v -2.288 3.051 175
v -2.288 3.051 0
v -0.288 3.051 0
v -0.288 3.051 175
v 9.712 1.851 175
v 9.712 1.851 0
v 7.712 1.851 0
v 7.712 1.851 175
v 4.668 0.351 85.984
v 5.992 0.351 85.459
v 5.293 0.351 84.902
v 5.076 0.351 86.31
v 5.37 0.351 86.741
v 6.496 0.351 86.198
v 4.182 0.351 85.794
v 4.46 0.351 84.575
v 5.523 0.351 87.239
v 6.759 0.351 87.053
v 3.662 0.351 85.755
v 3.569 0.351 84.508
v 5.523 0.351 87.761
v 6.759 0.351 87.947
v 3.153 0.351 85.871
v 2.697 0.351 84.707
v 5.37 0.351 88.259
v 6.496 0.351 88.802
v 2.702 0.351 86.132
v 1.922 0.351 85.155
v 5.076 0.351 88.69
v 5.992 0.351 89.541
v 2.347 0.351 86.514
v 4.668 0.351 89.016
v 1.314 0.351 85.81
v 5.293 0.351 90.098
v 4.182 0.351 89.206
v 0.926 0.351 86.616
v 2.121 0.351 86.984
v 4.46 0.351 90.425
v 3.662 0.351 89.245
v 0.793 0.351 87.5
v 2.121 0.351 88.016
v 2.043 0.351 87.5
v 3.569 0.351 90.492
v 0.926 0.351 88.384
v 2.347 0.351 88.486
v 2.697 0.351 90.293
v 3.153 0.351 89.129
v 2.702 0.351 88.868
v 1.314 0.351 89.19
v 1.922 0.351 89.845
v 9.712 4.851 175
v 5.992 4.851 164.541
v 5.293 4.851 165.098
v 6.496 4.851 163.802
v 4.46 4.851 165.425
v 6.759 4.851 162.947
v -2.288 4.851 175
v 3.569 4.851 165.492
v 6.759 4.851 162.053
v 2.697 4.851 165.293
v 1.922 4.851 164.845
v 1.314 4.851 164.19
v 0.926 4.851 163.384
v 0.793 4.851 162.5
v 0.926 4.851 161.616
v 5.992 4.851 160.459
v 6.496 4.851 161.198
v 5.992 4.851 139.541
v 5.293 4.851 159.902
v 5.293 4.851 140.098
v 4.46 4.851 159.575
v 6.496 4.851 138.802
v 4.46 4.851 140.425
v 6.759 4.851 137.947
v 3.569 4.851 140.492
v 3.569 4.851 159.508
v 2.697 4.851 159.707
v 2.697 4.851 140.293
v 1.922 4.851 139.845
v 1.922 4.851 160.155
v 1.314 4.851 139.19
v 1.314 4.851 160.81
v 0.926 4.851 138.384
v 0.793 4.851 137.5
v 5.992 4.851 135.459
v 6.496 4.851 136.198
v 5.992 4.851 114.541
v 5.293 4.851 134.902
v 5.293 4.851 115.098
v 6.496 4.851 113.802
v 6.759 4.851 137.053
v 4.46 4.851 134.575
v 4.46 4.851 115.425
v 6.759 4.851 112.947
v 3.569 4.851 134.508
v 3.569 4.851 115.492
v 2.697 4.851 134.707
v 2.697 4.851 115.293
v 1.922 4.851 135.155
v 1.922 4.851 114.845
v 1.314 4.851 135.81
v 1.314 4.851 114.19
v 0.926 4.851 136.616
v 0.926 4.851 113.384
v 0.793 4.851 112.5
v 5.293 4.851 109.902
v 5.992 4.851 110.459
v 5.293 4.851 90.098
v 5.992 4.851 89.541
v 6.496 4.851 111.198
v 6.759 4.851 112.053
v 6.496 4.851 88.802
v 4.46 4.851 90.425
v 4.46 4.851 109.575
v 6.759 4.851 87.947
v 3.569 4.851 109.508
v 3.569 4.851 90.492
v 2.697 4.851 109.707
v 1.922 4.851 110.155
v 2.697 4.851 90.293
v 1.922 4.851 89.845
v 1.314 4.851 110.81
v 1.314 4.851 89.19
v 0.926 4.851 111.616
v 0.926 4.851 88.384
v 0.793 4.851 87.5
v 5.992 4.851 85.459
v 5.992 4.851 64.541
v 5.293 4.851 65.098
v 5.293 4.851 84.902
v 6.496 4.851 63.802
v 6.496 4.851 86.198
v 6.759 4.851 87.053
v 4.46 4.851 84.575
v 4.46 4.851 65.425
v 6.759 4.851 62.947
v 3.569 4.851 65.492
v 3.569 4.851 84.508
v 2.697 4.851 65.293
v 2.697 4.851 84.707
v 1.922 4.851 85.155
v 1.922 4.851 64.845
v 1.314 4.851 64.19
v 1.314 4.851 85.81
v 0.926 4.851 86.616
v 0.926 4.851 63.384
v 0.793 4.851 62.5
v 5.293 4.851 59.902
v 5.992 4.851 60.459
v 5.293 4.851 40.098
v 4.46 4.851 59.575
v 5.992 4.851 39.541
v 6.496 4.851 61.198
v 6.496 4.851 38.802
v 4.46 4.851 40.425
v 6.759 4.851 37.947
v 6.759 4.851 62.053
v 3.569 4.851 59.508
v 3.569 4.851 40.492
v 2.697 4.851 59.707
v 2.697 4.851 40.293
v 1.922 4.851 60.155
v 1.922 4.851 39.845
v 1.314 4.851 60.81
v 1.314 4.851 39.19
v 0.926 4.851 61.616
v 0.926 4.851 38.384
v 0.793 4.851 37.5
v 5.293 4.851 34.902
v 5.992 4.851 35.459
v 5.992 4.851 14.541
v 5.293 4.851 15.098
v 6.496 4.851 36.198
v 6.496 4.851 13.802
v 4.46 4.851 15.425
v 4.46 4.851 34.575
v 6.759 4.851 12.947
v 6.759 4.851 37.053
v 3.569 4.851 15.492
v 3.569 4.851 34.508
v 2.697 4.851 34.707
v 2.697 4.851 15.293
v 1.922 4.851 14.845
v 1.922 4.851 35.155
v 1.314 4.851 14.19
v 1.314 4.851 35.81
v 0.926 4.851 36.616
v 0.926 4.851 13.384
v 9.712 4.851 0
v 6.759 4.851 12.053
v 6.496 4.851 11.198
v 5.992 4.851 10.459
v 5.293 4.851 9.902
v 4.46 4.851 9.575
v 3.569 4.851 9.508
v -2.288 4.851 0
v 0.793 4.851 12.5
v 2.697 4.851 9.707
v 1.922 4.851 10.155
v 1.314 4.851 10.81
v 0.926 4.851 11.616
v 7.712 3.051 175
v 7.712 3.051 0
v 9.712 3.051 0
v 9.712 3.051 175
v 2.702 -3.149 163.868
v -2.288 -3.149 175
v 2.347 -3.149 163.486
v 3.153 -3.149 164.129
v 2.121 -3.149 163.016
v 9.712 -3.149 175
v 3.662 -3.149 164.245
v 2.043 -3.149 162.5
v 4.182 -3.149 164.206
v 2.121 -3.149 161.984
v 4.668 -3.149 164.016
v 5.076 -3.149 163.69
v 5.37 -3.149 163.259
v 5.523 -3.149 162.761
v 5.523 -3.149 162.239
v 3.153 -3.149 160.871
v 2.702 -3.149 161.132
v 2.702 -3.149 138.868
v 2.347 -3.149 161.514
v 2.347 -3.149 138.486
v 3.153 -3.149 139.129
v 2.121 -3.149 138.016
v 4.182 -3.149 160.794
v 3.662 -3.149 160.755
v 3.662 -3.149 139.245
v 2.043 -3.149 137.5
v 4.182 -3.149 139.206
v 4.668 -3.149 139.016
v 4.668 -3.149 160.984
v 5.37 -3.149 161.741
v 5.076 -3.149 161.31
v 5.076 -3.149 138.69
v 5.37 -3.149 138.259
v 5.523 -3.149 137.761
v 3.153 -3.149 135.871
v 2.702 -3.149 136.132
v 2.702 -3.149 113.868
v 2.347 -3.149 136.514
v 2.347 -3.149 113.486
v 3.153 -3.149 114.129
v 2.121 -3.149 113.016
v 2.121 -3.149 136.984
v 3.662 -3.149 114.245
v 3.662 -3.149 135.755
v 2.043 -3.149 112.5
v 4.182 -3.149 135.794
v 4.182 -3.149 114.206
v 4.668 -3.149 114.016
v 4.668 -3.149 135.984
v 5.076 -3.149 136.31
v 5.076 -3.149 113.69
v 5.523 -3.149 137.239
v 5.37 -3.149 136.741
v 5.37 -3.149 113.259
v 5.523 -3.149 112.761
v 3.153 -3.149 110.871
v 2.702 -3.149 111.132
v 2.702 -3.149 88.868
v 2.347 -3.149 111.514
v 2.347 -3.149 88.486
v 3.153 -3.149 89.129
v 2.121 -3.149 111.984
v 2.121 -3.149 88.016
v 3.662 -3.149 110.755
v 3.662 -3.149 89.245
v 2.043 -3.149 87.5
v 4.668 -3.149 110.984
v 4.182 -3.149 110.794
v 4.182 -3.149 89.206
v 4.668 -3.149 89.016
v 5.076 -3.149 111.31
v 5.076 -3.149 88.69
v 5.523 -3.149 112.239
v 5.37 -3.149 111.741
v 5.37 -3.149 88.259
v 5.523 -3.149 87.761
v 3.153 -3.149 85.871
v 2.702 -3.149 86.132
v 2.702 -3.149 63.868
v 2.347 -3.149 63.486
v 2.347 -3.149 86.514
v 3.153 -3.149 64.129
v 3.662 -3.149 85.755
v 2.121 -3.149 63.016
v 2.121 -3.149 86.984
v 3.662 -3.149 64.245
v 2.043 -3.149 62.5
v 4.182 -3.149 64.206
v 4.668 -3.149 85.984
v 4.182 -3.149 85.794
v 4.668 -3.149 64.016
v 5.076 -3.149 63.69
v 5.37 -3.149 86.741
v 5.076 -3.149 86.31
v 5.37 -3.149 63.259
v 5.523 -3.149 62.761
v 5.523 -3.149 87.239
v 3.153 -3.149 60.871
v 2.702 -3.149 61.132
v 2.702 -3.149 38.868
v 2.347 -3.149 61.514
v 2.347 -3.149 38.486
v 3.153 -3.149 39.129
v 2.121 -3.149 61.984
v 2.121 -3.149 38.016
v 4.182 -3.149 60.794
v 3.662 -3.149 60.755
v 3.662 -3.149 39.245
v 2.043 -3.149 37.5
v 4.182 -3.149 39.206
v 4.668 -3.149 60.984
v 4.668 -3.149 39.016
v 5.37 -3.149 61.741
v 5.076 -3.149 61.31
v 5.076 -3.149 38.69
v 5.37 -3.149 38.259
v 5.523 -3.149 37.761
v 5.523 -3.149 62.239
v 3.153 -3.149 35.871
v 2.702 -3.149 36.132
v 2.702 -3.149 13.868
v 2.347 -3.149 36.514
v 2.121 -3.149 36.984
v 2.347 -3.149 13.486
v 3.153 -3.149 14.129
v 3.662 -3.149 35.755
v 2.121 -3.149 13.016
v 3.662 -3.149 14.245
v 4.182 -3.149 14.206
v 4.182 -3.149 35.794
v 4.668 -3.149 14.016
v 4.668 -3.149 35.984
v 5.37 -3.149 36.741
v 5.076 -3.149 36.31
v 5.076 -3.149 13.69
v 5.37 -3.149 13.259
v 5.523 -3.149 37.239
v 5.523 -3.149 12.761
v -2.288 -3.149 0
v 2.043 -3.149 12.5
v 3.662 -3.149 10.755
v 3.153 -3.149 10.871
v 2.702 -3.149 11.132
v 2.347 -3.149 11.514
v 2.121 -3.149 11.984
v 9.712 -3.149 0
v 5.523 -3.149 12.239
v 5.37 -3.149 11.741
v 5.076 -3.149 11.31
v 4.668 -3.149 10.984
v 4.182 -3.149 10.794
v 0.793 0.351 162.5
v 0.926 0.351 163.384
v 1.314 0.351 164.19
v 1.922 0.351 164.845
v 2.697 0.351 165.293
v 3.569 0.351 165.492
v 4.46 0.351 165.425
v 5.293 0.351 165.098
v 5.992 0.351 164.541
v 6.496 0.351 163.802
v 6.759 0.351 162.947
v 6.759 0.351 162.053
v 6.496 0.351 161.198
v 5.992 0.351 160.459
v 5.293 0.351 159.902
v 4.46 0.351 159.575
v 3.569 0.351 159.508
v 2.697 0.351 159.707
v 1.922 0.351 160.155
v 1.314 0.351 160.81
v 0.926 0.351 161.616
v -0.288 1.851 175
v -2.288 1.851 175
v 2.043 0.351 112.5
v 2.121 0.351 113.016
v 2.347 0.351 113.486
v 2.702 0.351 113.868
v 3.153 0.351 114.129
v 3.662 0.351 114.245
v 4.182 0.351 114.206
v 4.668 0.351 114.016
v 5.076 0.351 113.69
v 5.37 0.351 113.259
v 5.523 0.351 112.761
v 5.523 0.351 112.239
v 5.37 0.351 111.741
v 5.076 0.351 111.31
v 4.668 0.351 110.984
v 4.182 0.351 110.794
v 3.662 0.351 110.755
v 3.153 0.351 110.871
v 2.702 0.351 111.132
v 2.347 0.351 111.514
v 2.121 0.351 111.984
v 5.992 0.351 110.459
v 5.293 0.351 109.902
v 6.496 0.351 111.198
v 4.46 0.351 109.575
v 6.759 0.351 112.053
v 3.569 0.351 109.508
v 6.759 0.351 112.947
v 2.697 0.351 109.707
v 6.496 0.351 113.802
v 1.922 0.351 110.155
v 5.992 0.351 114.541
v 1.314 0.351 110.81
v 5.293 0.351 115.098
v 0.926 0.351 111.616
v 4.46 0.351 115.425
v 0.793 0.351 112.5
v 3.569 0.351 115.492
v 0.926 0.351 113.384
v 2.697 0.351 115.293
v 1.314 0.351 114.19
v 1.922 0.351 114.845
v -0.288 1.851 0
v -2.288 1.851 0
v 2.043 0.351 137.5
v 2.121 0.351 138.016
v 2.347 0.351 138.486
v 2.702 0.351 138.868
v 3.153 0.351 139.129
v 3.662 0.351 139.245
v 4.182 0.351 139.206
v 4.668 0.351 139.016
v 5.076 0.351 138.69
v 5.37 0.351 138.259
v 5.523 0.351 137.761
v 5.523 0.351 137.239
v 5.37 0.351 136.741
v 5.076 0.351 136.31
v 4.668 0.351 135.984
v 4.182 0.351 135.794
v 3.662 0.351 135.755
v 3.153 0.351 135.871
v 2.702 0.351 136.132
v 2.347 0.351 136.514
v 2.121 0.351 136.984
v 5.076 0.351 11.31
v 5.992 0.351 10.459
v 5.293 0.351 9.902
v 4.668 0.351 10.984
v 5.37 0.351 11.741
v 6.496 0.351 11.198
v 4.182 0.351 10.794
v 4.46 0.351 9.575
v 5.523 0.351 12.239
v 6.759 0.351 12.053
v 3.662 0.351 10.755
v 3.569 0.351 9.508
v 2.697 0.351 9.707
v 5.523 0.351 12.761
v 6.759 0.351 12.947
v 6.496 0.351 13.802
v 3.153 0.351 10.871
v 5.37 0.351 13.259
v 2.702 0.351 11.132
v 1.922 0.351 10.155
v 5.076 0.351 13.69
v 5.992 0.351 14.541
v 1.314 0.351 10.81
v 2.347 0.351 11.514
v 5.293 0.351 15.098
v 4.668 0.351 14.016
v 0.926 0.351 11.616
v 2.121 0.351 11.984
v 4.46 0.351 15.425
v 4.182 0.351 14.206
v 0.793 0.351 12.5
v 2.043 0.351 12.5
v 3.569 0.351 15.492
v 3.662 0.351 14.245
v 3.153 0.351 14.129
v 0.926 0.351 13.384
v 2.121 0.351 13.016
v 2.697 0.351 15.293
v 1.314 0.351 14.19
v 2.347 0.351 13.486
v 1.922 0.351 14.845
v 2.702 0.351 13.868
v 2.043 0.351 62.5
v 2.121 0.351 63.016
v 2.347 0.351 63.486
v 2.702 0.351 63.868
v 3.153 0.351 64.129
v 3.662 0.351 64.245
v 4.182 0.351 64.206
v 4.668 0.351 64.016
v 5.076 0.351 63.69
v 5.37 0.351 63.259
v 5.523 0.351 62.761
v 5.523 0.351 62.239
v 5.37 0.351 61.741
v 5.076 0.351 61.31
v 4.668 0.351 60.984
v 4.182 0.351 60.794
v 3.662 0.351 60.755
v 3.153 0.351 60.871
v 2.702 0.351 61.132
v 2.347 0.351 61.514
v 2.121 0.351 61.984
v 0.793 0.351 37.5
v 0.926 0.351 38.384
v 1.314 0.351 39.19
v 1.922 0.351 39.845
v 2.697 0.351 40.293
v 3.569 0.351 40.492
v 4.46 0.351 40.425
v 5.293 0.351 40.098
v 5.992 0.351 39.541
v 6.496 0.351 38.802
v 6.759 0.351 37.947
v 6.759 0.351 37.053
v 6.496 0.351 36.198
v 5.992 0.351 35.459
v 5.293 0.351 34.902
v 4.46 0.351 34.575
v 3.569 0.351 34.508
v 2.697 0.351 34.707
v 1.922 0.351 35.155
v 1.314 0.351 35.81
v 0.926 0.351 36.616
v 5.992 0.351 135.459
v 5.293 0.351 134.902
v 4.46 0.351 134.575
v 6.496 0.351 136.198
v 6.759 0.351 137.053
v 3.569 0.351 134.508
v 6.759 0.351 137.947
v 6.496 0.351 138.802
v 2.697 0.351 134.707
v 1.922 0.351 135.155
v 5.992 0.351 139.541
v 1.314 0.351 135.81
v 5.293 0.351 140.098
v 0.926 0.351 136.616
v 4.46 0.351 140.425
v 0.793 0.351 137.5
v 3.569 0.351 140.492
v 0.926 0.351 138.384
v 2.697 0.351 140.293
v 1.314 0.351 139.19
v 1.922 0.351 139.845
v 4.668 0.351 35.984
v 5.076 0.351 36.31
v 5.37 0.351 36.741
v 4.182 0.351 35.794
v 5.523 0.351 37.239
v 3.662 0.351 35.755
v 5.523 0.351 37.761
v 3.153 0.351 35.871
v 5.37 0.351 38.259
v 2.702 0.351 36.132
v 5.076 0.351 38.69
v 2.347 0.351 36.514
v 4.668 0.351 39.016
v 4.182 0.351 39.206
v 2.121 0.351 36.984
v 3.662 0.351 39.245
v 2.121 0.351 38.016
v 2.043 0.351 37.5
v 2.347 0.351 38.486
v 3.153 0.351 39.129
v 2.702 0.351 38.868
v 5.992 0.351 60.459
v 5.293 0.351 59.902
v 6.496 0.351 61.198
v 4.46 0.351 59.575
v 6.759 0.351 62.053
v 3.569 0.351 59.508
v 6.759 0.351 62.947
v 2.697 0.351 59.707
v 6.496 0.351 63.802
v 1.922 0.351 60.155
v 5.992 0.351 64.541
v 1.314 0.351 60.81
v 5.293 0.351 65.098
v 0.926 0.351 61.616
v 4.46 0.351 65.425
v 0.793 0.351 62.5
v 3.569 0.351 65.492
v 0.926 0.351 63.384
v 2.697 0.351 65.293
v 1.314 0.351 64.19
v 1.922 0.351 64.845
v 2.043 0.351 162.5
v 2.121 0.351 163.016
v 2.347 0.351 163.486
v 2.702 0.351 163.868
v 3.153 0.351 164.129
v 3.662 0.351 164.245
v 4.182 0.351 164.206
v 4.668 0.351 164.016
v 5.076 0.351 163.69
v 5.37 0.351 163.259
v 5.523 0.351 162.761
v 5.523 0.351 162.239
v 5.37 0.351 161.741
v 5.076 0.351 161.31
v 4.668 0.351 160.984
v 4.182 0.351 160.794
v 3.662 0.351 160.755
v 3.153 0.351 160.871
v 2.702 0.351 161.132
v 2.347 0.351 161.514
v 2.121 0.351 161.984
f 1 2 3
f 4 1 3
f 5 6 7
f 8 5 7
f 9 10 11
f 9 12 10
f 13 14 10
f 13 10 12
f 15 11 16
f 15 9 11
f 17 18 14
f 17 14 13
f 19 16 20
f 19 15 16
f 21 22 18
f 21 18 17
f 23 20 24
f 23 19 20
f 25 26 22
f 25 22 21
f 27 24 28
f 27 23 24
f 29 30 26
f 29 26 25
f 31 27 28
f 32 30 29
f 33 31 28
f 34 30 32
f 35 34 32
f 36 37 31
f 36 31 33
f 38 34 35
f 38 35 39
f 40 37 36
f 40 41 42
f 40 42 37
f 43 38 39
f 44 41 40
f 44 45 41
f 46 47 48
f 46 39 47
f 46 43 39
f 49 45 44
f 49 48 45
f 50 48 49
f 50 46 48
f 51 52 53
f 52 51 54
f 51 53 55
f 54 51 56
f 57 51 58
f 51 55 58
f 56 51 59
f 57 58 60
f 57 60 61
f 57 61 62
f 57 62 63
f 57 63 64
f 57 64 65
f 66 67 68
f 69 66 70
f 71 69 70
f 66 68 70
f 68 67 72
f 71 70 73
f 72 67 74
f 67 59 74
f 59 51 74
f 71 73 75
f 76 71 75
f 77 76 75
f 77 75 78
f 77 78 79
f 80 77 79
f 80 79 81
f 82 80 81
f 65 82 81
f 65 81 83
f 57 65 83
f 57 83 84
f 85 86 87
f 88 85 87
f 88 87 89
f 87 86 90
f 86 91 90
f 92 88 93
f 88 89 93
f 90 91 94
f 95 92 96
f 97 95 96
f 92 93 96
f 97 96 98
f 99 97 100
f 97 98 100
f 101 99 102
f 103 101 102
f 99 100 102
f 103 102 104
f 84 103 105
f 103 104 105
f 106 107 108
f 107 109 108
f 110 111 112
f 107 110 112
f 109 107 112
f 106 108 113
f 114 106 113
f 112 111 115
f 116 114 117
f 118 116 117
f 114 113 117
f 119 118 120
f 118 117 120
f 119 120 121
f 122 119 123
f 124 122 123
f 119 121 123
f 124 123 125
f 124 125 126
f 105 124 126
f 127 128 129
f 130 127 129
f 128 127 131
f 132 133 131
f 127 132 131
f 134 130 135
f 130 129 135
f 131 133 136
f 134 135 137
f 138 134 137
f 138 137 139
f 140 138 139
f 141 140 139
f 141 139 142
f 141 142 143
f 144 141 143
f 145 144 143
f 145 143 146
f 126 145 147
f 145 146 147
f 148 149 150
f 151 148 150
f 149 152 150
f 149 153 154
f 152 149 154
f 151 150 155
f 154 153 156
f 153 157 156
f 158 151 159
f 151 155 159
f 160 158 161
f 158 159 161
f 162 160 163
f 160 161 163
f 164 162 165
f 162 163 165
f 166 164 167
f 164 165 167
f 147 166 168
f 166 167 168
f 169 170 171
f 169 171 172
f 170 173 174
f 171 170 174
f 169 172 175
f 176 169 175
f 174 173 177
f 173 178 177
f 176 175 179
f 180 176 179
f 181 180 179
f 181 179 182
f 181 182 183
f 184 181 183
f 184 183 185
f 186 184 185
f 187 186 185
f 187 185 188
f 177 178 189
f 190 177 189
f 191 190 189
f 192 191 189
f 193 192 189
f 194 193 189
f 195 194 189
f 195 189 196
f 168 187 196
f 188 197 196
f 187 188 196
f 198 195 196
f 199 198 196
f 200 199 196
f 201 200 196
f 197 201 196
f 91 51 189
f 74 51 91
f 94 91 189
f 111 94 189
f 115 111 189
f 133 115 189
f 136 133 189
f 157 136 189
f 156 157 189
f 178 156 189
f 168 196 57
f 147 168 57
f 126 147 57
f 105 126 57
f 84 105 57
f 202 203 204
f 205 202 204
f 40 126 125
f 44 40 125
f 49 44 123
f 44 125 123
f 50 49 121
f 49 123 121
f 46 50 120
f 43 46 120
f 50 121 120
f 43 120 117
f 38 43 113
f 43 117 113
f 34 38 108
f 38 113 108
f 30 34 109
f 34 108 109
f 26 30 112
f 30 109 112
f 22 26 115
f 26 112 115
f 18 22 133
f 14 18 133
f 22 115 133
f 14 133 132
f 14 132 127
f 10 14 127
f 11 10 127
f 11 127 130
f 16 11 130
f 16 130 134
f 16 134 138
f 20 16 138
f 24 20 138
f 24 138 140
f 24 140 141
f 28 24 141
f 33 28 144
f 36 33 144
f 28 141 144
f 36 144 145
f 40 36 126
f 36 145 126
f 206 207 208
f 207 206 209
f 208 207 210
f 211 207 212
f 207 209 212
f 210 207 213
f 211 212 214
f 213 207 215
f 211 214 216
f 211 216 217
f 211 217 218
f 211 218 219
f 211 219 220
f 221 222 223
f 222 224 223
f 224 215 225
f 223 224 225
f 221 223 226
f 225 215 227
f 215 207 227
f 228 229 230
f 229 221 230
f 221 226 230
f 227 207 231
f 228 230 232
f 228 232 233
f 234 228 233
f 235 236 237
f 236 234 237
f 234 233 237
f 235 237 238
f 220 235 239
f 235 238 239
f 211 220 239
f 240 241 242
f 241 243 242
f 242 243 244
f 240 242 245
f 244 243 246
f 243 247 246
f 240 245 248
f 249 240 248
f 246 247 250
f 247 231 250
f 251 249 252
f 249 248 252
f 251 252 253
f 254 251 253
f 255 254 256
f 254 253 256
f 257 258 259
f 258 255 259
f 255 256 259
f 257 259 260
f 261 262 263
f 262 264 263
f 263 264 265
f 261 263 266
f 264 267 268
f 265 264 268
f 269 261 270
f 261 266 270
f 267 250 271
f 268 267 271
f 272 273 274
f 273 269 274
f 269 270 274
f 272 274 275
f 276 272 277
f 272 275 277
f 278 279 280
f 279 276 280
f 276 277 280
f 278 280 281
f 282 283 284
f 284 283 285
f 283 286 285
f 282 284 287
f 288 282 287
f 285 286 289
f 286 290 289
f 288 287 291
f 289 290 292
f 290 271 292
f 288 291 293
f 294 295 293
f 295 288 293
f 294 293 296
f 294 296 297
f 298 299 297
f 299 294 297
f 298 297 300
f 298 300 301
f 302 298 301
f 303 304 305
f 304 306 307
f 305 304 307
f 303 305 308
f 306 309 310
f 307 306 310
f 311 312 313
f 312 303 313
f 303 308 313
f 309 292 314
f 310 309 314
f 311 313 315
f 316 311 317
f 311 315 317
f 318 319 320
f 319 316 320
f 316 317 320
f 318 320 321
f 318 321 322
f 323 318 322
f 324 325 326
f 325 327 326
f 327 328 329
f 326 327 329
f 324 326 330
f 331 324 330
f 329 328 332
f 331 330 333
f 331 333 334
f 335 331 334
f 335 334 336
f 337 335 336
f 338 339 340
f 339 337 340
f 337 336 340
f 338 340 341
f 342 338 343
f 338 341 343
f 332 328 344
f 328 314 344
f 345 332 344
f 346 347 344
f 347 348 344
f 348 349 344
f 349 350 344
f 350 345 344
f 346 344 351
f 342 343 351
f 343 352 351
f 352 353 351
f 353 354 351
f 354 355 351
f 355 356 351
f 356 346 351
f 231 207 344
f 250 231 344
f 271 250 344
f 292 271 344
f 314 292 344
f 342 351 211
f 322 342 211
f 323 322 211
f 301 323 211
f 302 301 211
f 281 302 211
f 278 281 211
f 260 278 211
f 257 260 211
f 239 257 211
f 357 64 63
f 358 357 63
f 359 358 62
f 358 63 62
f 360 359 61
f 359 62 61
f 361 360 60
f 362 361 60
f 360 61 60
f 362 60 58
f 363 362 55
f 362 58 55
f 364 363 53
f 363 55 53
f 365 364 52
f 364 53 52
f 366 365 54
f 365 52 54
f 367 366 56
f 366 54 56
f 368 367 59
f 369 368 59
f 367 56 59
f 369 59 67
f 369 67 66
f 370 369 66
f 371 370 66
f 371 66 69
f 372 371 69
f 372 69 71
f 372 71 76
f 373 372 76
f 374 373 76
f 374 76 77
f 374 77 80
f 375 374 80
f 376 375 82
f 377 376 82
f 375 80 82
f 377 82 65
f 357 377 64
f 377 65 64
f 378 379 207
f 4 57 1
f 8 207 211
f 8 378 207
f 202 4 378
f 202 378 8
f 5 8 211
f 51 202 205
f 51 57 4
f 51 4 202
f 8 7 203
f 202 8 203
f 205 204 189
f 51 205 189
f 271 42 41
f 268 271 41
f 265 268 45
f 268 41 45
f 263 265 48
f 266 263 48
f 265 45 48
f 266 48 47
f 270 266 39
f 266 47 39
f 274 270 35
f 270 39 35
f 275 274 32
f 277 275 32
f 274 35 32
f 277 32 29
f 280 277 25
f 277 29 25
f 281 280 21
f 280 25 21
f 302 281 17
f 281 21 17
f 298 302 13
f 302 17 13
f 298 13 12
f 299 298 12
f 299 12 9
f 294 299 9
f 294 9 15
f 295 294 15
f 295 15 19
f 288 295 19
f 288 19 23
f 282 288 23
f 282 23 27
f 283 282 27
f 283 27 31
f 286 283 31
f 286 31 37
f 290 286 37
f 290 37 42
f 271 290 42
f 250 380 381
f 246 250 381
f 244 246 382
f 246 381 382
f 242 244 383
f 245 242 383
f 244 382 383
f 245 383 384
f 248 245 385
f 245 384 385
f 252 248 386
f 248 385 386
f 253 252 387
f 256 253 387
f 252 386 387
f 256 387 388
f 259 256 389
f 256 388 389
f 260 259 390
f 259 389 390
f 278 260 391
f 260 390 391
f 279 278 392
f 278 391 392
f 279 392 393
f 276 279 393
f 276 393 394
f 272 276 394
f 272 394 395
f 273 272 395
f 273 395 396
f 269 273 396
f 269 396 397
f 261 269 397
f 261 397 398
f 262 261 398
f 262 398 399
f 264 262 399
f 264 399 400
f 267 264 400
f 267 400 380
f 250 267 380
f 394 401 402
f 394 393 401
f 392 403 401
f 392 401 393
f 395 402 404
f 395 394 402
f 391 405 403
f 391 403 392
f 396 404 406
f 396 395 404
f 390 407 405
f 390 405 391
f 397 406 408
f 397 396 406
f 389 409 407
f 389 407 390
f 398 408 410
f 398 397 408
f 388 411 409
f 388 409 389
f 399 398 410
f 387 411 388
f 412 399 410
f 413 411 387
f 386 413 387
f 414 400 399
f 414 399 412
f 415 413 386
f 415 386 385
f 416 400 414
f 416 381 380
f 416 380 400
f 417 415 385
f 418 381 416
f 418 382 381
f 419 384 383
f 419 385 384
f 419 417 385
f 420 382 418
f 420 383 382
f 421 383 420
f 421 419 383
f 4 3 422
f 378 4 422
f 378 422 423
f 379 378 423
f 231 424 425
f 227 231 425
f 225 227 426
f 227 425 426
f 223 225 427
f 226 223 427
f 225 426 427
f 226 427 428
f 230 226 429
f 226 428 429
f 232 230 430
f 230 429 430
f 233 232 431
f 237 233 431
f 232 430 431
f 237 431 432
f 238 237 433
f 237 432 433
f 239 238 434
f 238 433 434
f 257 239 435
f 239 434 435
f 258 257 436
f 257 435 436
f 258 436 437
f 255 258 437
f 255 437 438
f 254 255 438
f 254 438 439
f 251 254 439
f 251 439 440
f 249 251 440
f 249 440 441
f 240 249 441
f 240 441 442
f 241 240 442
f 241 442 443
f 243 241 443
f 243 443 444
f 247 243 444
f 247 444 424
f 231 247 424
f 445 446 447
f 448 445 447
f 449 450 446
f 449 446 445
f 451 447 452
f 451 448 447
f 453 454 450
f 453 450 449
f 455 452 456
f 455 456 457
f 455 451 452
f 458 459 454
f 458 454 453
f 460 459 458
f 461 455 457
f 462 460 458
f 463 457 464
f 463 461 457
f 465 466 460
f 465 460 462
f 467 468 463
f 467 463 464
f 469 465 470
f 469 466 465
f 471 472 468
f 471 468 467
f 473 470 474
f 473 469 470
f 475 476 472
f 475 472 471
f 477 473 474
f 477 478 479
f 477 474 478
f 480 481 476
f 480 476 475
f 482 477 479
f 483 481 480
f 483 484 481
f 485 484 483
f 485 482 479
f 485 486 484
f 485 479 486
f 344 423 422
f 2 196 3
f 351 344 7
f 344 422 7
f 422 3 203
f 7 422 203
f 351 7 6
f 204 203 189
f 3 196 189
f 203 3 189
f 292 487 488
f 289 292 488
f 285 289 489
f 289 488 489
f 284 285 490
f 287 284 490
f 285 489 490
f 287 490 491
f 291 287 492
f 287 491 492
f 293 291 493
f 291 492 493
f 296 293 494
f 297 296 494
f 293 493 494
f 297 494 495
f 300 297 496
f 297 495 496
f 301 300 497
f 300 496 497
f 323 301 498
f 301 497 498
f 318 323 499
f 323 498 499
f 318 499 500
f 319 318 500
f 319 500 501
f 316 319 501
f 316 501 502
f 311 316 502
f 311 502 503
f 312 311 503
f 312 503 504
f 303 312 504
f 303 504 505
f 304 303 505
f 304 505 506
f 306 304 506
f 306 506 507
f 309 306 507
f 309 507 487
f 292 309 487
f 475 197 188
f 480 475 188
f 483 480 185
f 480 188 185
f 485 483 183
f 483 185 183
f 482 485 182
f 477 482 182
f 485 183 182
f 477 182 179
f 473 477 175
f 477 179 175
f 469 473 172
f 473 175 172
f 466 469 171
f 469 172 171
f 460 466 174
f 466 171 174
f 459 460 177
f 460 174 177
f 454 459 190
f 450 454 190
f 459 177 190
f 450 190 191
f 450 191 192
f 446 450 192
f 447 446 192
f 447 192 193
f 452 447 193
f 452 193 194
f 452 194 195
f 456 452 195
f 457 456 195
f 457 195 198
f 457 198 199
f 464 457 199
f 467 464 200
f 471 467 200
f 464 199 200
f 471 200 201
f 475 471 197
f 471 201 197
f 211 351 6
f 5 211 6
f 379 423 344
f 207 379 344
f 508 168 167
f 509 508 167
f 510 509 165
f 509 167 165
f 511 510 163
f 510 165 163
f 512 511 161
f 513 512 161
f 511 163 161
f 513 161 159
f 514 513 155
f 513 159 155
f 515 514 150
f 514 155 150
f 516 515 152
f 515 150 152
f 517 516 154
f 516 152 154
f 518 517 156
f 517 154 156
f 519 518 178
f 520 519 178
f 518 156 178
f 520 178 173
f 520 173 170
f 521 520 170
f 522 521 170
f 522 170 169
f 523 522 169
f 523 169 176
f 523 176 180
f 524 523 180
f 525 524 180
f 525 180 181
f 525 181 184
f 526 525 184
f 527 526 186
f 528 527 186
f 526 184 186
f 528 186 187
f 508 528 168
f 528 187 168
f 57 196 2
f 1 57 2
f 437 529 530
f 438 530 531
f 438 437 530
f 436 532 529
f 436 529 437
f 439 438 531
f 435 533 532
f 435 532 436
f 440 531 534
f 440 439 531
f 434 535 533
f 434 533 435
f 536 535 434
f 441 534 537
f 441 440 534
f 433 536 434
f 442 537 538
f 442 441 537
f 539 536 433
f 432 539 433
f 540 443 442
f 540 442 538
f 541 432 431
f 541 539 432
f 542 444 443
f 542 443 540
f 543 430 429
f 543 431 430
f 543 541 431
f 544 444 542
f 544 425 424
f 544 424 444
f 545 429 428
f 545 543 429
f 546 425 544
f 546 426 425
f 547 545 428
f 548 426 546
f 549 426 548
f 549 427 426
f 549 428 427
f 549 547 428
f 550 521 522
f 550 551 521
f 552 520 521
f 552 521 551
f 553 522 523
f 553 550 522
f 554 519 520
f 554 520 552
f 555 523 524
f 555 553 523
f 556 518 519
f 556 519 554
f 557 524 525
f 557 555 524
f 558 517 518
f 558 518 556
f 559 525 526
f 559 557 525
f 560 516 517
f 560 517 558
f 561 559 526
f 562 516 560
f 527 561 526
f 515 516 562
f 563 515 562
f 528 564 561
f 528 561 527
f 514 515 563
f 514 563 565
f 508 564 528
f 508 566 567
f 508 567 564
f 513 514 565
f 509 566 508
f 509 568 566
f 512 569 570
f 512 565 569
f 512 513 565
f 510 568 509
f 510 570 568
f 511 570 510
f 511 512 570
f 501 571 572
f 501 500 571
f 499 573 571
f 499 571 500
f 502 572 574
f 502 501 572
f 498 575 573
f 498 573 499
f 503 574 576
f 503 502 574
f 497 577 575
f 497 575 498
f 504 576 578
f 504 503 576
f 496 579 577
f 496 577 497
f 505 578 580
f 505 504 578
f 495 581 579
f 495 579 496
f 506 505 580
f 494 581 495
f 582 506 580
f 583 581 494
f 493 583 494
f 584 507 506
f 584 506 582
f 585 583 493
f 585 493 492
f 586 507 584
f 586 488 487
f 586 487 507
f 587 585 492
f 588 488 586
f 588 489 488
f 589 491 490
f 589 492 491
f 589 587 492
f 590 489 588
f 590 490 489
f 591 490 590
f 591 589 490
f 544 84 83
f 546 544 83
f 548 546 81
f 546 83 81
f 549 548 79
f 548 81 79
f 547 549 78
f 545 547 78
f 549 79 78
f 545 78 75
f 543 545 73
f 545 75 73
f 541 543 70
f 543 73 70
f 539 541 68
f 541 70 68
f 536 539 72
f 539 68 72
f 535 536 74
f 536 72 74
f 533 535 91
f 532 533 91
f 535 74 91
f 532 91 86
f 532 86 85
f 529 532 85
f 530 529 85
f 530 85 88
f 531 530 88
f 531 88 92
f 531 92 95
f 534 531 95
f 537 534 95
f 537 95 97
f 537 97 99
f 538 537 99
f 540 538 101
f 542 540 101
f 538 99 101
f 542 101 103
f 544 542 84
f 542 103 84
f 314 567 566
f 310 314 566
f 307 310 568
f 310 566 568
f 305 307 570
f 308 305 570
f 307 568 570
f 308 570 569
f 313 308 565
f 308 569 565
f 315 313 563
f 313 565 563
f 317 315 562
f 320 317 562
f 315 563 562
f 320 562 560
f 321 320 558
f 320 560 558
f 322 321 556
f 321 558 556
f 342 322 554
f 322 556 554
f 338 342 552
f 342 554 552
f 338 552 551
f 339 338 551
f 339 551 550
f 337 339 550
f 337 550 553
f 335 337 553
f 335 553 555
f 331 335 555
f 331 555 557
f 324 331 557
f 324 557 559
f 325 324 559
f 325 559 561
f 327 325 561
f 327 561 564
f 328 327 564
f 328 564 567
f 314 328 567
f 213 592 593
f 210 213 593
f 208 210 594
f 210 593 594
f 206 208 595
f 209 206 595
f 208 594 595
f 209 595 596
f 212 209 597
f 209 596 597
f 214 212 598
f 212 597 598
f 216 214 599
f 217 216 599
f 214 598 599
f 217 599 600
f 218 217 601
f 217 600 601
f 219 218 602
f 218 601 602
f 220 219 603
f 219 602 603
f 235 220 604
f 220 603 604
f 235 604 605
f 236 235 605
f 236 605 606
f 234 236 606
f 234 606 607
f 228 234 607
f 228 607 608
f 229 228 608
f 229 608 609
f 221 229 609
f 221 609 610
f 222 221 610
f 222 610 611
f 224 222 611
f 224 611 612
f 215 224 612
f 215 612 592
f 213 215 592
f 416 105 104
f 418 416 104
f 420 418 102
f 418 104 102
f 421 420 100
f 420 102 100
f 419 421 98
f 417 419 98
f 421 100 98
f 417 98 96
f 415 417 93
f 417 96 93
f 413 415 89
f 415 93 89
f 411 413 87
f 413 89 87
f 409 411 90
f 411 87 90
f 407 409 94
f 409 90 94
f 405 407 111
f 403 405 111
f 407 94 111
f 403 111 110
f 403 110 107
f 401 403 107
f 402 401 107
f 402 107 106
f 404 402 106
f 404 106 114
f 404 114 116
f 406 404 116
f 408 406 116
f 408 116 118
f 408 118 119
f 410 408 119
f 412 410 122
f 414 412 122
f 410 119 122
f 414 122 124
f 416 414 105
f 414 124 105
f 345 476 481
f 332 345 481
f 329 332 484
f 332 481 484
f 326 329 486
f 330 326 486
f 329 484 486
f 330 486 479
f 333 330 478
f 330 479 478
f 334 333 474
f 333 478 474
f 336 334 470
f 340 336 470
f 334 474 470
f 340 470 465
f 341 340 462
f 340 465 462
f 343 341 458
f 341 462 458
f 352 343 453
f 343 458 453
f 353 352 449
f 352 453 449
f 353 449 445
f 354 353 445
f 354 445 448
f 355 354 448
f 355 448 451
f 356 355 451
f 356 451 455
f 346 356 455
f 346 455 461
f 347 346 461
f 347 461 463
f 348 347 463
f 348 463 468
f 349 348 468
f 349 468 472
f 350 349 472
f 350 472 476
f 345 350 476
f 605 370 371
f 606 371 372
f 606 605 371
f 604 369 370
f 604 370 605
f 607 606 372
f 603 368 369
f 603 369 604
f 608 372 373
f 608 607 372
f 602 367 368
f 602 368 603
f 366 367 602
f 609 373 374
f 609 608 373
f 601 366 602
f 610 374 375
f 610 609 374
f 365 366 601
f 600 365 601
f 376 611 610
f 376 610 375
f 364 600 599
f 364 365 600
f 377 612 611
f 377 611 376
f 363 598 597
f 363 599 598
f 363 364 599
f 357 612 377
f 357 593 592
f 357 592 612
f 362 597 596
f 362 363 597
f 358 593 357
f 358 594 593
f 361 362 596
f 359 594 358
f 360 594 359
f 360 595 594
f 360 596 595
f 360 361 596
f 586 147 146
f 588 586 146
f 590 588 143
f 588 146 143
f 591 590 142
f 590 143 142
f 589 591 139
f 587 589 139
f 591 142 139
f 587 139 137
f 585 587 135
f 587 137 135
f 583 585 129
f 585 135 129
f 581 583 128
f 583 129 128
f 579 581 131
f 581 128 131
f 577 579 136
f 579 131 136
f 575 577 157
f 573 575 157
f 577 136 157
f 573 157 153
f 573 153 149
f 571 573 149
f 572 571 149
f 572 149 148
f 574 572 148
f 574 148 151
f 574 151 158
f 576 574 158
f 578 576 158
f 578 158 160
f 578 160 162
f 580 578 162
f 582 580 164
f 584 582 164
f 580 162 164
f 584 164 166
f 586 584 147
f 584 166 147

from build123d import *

# Parameters (mm, degrees)
BOSS_EXTRU_1_DEPTH      = 175
ESQUISSE2_R             = 3
ENL_V_MAT_EXTRU_1_DEPTH = 4.5
ENL_V_MAT_EXTRU_2_REACH = 177.327
ESQUISSE3_R             = 1.75


with BuildPart() as part:
    # Esquisse1 → Boss.-Extru.1 (new body)
    with BuildSketch(Plane.XY):
        Polygon((-2.287966089, -3.148854962), (9.712033911, -3.148854962), (9.712033911, 1.851145038), (7.712033911, 1.851145038), (7.712033911, 3.051145038), (9.712033911, 3.051145038), (9.712033911, 4.851145038), (-2.287966089, 4.851145038), (-2.287966089, 3.051145038), (-0.287966089, 3.051145038), (-0.287966089, 1.851145038), (-2.287966089, 1.851145038), align=None)
    extrude(amount=BOSS_EXTRU_1_DEPTH)

    # Esquisse2 → Enlèv. mat.-Extru.1 (cut)
    with BuildSketch(Plane(origin=(0, 4.851145038, 0), x_dir=(1, 0, 0), z_dir=(0, 1, 0))):
        with Locations(Location((3.792841972, -162.5, 0), (0, 0, 180))):
            Circle(ESQUISSE2_R)
        with Locations(Location((3.792841972, -137.5, 0), (0, 0, 180))):
            Circle(ESQUISSE2_R)
        with Locations(Location((3.792841972, -112.5, 0), (0, 0, 180))):
            Circle(ESQUISSE2_R)
        with Locations(Location((3.792841972, -87.5, 0), (0, 0, 180))):
            Circle(ESQUISSE2_R)
        with Locations(Location((3.792841972, -62.5, 0), (0, 0, 180))):
            Circle(ESQUISSE2_R)
        with Locations(Location((3.792841972, -37.5, 0), (0, 0, 180))):
            Circle(ESQUISSE2_R)
        with Locations(Location((3.792841972, -12.5, 0), (0, 0, 180))):
            Circle(ESQUISSE2_R)
    extrude(amount=-ENL_V_MAT_EXTRU_1_DEPTH, mode=Mode.SUBTRACT)

    # Esquisse3 → Enlèv. mat.-Extru.2 (cut, up to next)
    with BuildSketch(Plane(origin=(0, 0.351145038, 0), x_dir=(1, 0, 0), z_dir=(0, 1, 0)), mode=Mode.PRIVATE) as enl_v_mat_extru_2_sk1:
        with Locations(Location((3.792841972, -162.5, 0), (0, 0, 180))):
            Circle(ESQUISSE3_R)
    enl_v_mat_extru_2_tool1 = extrude(enl_v_mat_extru_2_sk1.sketch, amount=-ENL_V_MAT_EXTRU_2_REACH, mode=Mode.PRIVATE) & part.part
    # Esquisse3 → Enlèv. mat.-Extru.2 (cut, up to next)
    with BuildSketch(Plane(origin=(0, 0.351145038, 0), x_dir=(1, 0, 0), z_dir=(0, 1, 0)), mode=Mode.PRIVATE) as enl_v_mat_extru_2_sk2:
        with Locations(Location((3.792841972, -137.5, 0), (0, 0, 180))):
            Circle(ESQUISSE3_R)
    enl_v_mat_extru_2_tool2 = extrude(enl_v_mat_extru_2_sk2.sketch, amount=-ENL_V_MAT_EXTRU_2_REACH, mode=Mode.PRIVATE) & part.part
    # Esquisse3 → Enlèv. mat.-Extru.2 (cut, up to next)
    with BuildSketch(Plane(origin=(0, 0.351145038, 0), x_dir=(1, 0, 0), z_dir=(0, 1, 0)), mode=Mode.PRIVATE) as enl_v_mat_extru_2_sk3:
        with Locations(Location((3.792841972, -112.5, 0), (0, 0, 180))):
            Circle(ESQUISSE3_R)
    enl_v_mat_extru_2_tool3 = extrude(enl_v_mat_extru_2_sk3.sketch, amount=-ENL_V_MAT_EXTRU_2_REACH, mode=Mode.PRIVATE) & part.part
    # Esquisse3 → Enlèv. mat.-Extru.2 (cut, up to next)
    with BuildSketch(Plane(origin=(0, 0.351145038, 0), x_dir=(1, 0, 0), z_dir=(0, 1, 0)), mode=Mode.PRIVATE) as enl_v_mat_extru_2_sk4:
        with Locations(Location((3.792841972, -87.5, 0), (0, 0, 180))):
            Circle(ESQUISSE3_R)
    enl_v_mat_extru_2_tool4 = extrude(enl_v_mat_extru_2_sk4.sketch, amount=-ENL_V_MAT_EXTRU_2_REACH, mode=Mode.PRIVATE) & part.part
    # Esquisse3 → Enlèv. mat.-Extru.2 (cut, up to next)
    with BuildSketch(Plane(origin=(0, 0.351145038, 0), x_dir=(1, 0, 0), z_dir=(0, 1, 0)), mode=Mode.PRIVATE) as enl_v_mat_extru_2_sk5:
        with Locations(Location((3.792841972, -62.5, 0), (0, 0, 180))):
            Circle(ESQUISSE3_R)
    enl_v_mat_extru_2_tool5 = extrude(enl_v_mat_extru_2_sk5.sketch, amount=-ENL_V_MAT_EXTRU_2_REACH, mode=Mode.PRIVATE) & part.part
    # Esquisse3 → Enlèv. mat.-Extru.2 (cut, up to next)
    with BuildSketch(Plane(origin=(0, 0.351145038, 0), x_dir=(1, 0, 0), z_dir=(0, 1, 0)), mode=Mode.PRIVATE) as enl_v_mat_extru_2_sk6:
        with Locations(Location((3.792841972, -37.5, 0), (0, 0, 180))):
            Circle(ESQUISSE3_R)
    enl_v_mat_extru_2_tool6 = extrude(enl_v_mat_extru_2_sk6.sketch, amount=-ENL_V_MAT_EXTRU_2_REACH, mode=Mode.PRIVATE) & part.part
    # Esquisse3 → Enlèv. mat.-Extru.2 (cut, up to next)
    with BuildSketch(Plane(origin=(0, 0.351145038, 0), x_dir=(1, 0, 0), z_dir=(0, 1, 0)), mode=Mode.PRIVATE) as enl_v_mat_extru_2_sk7:
        with Locations(Location((3.792841972, -12.5, 0), (0, 0, 180))):
            Circle(ESQUISSE3_R)
    enl_v_mat_extru_2_tool7 = extrude(enl_v_mat_extru_2_sk7.sketch, amount=-ENL_V_MAT_EXTRU_2_REACH, mode=Mode.PRIVATE) & part.part
    add(enl_v_mat_extru_2_tool1.solids().sort_by_distance((3.792842, 0.351145, 162.5))[0], mode=Mode.SUBTRACT)
    add(enl_v_mat_extru_2_tool2.solids().sort_by_distance((3.792842, 0.351145, 137.5))[0], mode=Mode.SUBTRACT)
    add(enl_v_mat_extru_2_tool3.solids().sort_by_distance((3.792842, 0.351145, 112.5))[0], mode=Mode.SUBTRACT)
    add(enl_v_mat_extru_2_tool4.solids().sort_by_distance((3.792842, 0.351145, 87.5))[0], mode=Mode.SUBTRACT)
    add(enl_v_mat_extru_2_tool5.solids().sort_by_distance((3.792842, 0.351145, 62.5))[0], mode=Mode.SUBTRACT)
    add(enl_v_mat_extru_2_tool6.solids().sort_by_distance((3.792842, 0.351145, 37.5))[0], mode=Mode.SUBTRACT)
    add(enl_v_mat_extru_2_tool7.solids().sort_by_distance((3.792842, 0.351145, 12.5))[0], mode=Mode.SUBTRACT)


solid = part.part
